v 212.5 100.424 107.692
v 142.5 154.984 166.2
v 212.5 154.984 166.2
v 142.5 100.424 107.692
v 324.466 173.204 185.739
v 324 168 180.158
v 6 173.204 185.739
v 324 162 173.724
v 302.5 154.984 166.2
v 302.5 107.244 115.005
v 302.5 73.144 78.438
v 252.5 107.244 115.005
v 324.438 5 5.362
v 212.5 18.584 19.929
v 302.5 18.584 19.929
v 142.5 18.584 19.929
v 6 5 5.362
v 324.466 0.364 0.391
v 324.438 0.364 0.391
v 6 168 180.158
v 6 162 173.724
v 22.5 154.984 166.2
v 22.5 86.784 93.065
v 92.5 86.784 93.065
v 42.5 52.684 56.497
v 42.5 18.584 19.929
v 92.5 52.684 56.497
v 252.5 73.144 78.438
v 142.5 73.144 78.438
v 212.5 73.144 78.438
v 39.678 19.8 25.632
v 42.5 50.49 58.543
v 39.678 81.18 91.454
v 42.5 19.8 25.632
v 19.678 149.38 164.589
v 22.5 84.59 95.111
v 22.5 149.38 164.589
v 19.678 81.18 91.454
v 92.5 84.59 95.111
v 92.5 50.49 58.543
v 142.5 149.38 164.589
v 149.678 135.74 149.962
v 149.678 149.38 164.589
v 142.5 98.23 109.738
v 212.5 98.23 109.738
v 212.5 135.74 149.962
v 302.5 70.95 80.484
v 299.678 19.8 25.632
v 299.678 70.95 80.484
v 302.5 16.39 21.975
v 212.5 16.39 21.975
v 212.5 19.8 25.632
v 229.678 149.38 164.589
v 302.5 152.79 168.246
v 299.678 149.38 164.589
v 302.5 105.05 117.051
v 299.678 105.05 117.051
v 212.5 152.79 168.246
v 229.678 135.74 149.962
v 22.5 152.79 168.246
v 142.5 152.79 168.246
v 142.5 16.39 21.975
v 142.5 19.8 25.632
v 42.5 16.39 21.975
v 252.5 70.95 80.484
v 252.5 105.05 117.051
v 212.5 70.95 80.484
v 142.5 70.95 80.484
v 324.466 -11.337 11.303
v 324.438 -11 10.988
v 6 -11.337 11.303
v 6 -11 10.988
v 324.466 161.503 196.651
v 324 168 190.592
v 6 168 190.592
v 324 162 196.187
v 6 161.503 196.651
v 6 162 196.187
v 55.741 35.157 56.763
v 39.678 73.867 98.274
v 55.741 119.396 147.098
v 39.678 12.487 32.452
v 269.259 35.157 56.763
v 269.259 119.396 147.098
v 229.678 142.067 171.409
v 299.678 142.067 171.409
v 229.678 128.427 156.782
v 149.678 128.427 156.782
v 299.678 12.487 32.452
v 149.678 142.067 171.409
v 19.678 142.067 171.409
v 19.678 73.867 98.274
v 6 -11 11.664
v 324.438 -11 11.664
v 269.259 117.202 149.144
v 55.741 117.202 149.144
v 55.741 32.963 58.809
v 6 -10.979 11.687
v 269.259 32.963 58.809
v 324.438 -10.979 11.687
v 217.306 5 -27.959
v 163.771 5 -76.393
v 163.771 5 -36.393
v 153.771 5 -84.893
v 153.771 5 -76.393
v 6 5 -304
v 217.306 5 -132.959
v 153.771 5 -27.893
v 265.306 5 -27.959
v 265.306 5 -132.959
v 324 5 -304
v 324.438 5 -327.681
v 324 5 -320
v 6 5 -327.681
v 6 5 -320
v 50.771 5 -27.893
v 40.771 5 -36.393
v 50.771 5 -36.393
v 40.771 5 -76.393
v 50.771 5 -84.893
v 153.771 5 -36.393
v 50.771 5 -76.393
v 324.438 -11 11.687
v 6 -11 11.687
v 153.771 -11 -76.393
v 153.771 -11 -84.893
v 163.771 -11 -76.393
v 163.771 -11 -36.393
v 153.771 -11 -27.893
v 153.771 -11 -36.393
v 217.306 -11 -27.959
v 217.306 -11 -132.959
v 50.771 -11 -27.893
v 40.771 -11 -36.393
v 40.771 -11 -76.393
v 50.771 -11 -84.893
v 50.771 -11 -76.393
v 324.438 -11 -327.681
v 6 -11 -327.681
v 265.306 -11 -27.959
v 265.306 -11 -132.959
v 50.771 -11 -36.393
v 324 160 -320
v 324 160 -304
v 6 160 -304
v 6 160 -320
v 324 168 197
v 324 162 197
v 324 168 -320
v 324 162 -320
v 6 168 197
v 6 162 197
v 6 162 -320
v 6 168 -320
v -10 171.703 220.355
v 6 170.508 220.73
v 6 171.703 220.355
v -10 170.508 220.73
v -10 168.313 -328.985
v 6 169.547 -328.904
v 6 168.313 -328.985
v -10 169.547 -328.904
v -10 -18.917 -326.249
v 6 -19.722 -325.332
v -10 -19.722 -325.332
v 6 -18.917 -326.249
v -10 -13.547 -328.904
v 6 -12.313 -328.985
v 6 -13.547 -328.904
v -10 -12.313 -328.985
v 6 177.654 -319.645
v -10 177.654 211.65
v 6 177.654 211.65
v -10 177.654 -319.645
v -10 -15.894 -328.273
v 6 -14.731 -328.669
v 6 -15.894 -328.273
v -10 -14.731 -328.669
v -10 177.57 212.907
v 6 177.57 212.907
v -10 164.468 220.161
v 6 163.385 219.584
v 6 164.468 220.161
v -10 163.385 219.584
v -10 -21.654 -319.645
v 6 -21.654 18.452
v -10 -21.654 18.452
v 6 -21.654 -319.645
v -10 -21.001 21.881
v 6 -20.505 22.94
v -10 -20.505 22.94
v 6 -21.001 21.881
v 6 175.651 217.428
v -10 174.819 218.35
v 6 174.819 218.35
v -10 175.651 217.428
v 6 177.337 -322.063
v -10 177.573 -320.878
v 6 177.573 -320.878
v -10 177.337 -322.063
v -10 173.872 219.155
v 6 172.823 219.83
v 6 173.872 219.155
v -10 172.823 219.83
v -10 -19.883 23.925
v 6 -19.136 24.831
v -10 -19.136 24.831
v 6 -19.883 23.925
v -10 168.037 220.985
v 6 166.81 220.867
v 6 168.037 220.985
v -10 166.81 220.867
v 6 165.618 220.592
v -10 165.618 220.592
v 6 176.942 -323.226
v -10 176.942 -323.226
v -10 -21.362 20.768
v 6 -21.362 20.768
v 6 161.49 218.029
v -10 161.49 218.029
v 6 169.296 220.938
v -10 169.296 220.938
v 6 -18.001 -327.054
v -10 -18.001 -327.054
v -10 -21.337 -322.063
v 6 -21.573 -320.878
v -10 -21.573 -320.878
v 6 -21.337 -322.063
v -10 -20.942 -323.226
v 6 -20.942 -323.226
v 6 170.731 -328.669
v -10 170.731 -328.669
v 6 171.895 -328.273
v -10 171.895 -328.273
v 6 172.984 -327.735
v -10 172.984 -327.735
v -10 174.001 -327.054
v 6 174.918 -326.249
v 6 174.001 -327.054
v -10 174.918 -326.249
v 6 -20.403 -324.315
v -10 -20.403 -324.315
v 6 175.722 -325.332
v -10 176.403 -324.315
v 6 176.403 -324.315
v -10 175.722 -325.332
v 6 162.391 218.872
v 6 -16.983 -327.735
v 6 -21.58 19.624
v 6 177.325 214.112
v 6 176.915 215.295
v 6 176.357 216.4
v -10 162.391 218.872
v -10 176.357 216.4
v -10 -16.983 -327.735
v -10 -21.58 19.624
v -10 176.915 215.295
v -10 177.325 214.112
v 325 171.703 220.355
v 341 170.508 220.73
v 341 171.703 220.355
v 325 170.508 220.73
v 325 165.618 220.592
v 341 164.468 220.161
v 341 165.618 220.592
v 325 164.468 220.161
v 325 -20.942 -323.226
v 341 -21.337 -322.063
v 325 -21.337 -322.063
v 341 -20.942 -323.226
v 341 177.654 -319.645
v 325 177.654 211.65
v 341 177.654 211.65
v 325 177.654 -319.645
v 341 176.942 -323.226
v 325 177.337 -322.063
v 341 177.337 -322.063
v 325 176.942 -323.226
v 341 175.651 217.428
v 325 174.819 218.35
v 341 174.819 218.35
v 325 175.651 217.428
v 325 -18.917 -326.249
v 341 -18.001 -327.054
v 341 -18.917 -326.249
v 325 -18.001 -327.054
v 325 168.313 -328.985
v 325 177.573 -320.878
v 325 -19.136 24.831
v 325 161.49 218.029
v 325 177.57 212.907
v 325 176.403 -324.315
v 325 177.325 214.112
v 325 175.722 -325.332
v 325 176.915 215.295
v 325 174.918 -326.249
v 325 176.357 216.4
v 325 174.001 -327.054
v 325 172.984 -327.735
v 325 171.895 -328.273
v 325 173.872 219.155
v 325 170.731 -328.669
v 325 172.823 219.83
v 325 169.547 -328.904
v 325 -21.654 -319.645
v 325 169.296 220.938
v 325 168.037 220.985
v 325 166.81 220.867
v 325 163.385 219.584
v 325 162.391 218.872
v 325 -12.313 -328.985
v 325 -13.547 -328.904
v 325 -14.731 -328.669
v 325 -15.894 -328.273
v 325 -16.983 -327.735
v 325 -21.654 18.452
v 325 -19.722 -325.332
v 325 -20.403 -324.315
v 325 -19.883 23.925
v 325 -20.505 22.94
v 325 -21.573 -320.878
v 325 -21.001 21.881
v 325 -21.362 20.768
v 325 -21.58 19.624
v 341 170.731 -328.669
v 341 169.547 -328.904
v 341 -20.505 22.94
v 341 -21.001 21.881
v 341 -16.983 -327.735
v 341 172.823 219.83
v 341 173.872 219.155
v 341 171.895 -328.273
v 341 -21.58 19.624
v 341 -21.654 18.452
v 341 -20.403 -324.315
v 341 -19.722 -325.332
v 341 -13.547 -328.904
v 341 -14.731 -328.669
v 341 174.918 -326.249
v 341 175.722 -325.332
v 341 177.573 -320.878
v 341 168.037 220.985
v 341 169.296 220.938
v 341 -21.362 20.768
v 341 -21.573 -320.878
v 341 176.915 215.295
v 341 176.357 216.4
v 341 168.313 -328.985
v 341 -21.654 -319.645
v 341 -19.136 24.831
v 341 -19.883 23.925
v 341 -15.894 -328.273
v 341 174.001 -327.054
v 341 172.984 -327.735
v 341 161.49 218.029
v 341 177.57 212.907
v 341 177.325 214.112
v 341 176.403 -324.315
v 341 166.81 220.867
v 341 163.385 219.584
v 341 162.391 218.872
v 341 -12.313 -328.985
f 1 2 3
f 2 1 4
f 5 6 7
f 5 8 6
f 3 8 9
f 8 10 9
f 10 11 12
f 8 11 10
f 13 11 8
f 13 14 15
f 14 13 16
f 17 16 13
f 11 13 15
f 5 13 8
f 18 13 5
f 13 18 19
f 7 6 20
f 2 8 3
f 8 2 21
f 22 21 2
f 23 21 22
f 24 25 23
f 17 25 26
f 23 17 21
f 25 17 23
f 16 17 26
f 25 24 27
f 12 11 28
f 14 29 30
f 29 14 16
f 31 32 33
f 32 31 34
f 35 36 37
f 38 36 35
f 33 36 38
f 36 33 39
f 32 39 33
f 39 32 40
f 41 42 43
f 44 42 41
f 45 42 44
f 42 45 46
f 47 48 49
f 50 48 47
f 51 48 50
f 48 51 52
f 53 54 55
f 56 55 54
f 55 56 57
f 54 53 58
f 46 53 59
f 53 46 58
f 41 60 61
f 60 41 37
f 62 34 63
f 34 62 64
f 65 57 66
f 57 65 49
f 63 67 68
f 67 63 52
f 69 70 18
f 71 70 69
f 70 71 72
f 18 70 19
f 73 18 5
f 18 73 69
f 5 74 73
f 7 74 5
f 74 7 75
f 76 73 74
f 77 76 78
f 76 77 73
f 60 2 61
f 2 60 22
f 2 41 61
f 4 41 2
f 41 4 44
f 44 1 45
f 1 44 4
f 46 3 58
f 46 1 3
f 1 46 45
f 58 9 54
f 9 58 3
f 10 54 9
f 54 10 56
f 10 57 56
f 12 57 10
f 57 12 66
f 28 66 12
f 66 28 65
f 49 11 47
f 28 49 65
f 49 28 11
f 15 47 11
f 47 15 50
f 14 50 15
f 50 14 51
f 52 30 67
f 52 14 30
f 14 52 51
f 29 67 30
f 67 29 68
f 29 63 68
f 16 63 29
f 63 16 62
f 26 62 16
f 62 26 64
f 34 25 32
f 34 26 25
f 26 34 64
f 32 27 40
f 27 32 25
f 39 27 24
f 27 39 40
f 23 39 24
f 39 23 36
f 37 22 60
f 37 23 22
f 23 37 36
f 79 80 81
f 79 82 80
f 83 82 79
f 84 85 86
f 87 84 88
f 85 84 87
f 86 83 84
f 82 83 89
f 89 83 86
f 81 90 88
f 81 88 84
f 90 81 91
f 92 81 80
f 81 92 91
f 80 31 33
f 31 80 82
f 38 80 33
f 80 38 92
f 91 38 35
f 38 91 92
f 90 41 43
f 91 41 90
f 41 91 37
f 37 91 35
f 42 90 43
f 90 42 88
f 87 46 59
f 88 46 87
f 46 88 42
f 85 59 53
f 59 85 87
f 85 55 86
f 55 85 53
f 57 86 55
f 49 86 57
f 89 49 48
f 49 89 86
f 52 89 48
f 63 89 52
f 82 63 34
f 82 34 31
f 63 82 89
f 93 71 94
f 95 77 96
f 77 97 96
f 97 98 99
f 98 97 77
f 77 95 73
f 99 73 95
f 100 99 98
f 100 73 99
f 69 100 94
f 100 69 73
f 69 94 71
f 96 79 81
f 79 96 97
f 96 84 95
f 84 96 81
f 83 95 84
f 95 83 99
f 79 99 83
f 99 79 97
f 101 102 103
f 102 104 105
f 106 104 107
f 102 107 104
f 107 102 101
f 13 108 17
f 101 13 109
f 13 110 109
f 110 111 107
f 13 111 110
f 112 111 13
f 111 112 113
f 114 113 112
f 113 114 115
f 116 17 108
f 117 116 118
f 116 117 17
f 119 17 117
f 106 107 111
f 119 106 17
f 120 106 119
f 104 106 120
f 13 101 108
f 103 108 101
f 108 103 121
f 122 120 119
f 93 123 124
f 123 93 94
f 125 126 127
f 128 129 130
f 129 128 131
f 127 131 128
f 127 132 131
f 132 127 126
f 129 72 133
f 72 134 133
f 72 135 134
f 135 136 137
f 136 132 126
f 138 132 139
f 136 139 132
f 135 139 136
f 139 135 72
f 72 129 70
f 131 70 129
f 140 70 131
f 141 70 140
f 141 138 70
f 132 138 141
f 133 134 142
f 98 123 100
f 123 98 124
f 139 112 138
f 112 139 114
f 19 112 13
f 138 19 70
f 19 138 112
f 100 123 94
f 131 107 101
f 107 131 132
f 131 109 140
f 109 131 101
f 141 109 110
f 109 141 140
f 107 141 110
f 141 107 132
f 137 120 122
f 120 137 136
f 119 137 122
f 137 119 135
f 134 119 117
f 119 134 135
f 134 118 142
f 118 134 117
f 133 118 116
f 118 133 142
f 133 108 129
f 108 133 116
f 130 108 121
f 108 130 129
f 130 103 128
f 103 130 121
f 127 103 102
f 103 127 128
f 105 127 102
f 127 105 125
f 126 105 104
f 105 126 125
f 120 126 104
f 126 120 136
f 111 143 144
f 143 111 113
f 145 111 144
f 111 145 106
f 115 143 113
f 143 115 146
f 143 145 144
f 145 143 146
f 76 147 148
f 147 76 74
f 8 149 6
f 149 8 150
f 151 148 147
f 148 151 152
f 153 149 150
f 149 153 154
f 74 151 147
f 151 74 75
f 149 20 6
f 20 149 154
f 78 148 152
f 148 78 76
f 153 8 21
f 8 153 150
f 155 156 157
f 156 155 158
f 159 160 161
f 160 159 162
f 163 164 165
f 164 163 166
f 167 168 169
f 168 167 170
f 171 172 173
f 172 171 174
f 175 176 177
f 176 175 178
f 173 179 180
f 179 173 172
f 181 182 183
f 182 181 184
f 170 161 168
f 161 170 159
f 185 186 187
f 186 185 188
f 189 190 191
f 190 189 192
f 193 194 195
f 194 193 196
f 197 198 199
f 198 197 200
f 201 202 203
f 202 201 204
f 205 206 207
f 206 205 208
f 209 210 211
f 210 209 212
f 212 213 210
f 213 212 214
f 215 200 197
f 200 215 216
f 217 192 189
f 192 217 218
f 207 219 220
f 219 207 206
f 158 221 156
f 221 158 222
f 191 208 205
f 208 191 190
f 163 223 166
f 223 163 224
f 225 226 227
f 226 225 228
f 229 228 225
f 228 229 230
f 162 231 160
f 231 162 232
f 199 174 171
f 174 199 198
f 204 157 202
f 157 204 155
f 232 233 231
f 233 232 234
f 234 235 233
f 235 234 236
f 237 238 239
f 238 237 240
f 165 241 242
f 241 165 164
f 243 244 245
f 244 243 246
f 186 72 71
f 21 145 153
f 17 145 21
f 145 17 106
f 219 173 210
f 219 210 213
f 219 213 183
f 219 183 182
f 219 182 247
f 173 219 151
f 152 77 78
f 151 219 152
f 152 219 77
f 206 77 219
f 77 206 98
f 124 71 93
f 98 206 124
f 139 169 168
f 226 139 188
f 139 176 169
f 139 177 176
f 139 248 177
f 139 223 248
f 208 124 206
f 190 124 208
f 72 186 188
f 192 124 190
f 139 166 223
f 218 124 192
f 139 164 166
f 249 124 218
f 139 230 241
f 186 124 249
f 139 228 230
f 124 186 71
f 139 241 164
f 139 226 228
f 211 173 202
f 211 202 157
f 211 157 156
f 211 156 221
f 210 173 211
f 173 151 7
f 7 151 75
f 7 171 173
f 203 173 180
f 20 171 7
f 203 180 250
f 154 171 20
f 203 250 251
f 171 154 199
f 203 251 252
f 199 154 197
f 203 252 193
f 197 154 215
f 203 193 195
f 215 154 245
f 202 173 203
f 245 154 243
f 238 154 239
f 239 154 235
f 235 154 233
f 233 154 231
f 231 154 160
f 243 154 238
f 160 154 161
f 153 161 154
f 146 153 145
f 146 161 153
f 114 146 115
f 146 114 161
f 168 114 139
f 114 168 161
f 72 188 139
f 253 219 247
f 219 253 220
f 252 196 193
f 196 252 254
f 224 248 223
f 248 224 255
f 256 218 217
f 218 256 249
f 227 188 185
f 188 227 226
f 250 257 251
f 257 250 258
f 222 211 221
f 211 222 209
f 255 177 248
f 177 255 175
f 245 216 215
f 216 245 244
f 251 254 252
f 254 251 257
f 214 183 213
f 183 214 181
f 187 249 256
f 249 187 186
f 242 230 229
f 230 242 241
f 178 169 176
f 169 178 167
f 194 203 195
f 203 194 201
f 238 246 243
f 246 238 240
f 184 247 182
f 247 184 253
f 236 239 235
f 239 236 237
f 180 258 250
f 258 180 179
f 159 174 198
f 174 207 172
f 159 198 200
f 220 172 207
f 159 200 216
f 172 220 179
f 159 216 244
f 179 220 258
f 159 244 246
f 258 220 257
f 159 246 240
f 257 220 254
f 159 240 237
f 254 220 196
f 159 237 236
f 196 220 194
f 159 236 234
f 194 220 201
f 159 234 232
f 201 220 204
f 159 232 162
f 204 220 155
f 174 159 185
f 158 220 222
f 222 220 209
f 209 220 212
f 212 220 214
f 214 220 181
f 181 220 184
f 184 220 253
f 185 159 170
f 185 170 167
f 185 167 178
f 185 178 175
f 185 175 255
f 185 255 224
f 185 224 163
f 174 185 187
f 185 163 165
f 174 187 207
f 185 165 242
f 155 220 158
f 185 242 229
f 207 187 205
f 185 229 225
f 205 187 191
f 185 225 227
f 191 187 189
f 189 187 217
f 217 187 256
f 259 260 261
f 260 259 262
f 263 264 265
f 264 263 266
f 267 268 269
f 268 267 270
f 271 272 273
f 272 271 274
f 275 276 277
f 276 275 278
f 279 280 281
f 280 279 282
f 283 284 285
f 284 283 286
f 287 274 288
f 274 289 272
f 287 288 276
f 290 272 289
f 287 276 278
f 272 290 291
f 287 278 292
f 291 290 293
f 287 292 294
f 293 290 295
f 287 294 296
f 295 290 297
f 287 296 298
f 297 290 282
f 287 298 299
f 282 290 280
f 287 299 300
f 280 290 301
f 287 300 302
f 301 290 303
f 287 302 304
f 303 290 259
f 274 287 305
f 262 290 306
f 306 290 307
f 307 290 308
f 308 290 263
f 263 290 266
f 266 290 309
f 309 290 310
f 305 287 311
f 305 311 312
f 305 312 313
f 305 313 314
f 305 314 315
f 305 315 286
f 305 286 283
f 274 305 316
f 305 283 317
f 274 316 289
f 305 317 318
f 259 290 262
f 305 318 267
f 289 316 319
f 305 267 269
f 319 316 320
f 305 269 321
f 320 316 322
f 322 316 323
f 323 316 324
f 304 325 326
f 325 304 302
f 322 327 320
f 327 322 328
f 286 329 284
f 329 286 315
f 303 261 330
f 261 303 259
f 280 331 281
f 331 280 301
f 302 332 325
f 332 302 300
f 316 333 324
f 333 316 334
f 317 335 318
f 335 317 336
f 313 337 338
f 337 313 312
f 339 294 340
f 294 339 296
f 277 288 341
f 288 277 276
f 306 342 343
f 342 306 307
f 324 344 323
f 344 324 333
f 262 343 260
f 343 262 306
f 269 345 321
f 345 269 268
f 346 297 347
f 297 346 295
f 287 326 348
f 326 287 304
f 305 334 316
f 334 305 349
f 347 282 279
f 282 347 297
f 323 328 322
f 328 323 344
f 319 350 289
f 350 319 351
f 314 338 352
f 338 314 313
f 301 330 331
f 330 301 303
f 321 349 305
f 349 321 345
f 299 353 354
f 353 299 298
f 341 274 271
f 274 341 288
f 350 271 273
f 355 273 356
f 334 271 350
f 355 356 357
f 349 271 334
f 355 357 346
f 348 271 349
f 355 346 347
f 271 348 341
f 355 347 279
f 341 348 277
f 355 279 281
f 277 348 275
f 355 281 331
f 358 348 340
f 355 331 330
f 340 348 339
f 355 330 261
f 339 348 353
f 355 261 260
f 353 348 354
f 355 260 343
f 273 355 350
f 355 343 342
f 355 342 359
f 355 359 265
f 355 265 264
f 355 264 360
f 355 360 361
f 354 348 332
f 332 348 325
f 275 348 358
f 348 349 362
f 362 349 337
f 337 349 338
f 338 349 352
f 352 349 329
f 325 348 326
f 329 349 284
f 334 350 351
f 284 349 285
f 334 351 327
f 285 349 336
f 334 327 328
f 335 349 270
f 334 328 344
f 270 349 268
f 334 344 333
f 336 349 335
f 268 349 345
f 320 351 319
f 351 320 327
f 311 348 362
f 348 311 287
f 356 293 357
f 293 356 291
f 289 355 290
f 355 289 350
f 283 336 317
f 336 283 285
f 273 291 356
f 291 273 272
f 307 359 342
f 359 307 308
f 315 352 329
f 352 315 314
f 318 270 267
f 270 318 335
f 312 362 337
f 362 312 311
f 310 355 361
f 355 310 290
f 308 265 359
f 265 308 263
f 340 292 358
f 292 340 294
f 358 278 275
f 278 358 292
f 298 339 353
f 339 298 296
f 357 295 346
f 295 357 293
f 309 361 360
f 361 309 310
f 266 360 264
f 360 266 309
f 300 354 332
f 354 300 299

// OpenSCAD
/* 3D representation of Donation Box
*  
* Description: A 3D model of the initial version of Donation Box. The design include the tablet casing, the thermal printer and coin acceptor cuts. Details are not included.
*
* Author: Commonslab.gr
* License: CC-BY-SA v4.0 
*/

/*Set Themes*/
theme = "greek island"; //"attention";

surface_color = theme=="greek island" ? "RoyalBlue" : "OrangeRed";
side_color = theme=="greek island" ? "White" : "DarkSlateGray";

tablet_color ="Black";
tablet_back_color="Black";


module side_panel(h)
{
    color(side_color)
  scale([25.4/90, -25.4/90, 1]) union()
  {
    linear_extrude(height=h)
      polygon([[319.029295,-974.355450],[314.679432,-973.939007],[310.458314,-972.963828],[306.384014,-971.438098],[302.544942,-969.391321],[299.021511,-966.870154],[295.832035,-963.882850],[289.023977,-956.600953],[282.215482,-949.318588],[275.407413,-942.036679],[268.598413,-934.753775],[261.789307,-927.470756],[254.980939,-920.188527],[248.171642,-912.905305],[241.363305,-905.623109],[234.554502,-898.340415],[227.746157,-891.058211],[220.937034,-883.775174],[214.128652,-876.492931],[207.320120,-869.210526],[200.511764,-861.928310],[193.703336,-854.646017],[186.894858,-847.363671],[180.086214,-840.081147],[173.277629,-832.798685],[166.468953,-825.516128],[159.659941,-818.233210],[152.851555,-810.950962],[146.042875,-803.668399],[139.234505,-796.386168],[132.425406,-789.103157],[125.616278,-781.820116],[118.807447,-774.537391],[111.998923,-767.254995],[105.190460,-759.972666],[98.381608,-752.689918],[91.572839,-745.407261],[84.764491,-738.125054],[77.955724,-730.842398],[71.146715,-723.559483],[64.338657,-716.277587],[57.529534,-708.994550],[50.720528,-701.711639],[43.911776,-694.429000],[37.102428,-687.145722],[30.293767,-679.863180],[23.485092,-672.580623],[16.675834,-665.297442],[9.867542,-658.015294],[3.058906,-650.732779],[-3.749237,-643.450790],[-10.557822,-636.168330],[-17.366598,-628.885664],[-24.175111,-621.603281],[-30.983607,-614.320915],[-37.792960,-607.037632],[-44.601929,-599.754761],[-51.410783,-592.472012],[-58.219437,-585.189478],[-65.027440,-577.907639],[-71.835634,-570.625596],[-78.644362,-563.342983],[-85.452664,-556.060824],[-92.261482,-548.778113],[-99.070349,-541.495352],[-105.879711,-534.212059],[-112.687837,-526.930089],[-119.496699,-519.647332],[-126.305882,-512.364232],[-133.114110,-505.082152],[-139.923227,-497.799123],[-146.732507,-490.515919],[-153.541344,-483.233188],[-160.350290,-475.950340],[-167.158346,-468.668445],[-173.967517,-461.385358],[-180.775487,-454.103555],[-187.584495,-446.820641],[-194.393065,-439.538197],[-201.202115,-432.255238],[-208.010263,-424.973244],[-214.819073,-417.690543],[-221.627435,-410.408321],[-228.436147,-403.125724],[-235.244852,-395.843134],[-242.053874,-388.560206],[-248.862344,-381.277868],[-255.671515,-373.994781],[-262.480111,-366.712308],[-269.289174,-359.429335],[-276.098318,-352.146276],[-282.906760,-344.863968],[-289.714668,-337.582232],[-296.523366,-330.299650],[-303.332344,-323.016769],[-310.140803,-315.734442],[-316.949991,-308.451337],[-323.758120,-301.169363],[-330.567011,-293.886575],[-337.375590,-286.604120],[-344.183595,-279.322280],[-346.827888,-276.111048],[-349.032827,-272.621875],[-350.792525,-268.869720],[-352.069664,-264.927118],[-352.841979,-260.872435],[-353.103515,-256.720720],[-353.103515,-246.737852],[-353.103515,-236.754129],[-353.103515,-226.770934],[-353.103515,-216.787561],[-353.103515,-206.804260],[-353.103515,-196.821059],[-353.103515,-186.838536],[-353.103515,-176.855324],[-353.103515,-166.872553],[-353.103515,-156.889702],[-353.103515,-146.906390],[-353.103515,-136.923699],[-353.103515,-126.941378],[-353.103515,-116.958674],[-353.103515,-106.976266],[-353.103515,-96.994010],[-353.103515,-87.009990],[-353.103515,-77.026982],[-353.103515,-67.043535],[-353.103515,-57.060108],[-353.103515,-47.077527],[-353.103515,-37.095272],[-353.103515,-27.111657],[-353.103515,-17.128026],[-353.103515,-7.144922],[-353.103515,2.837811],[-353.103515,12.820944],[-353.103515,22.803735],[-353.103515,32.787934],[-353.103515,42.771589],[-353.103515,52.755131],[-353.103515,62.739282],[-353.103515,72.722966],[-353.103515,82.705326],[-353.103515,92.687741],[-353.103515,102.671740],[-353.103515,112.654902],[-353.103515,122.639000],[-353.103515,132.621830],[-353.103515,142.605324],[-353.103515,152.589434],[-353.103515,162.572156],[-353.103515,172.555525],[-353.103515,182.539573],[-353.103515,192.522367],[-353.103515,202.505914],[-353.103515,212.488270],[-353.103515,222.471361],[-353.103515,232.455106],[-353.103515,242.437469],[-353.103515,252.420183],[-353.103515,262.402981],[-353.103515,272.385523],[-353.103515,282.369222],[-353.103515,292.351689],[-353.103515,302.334120],[-353.103515,312.317539],[-353.103515,322.301023],[-353.103515,332.283533],[-353.103515,342.267383],[-353.103515,352.251184],[-353.103515,362.233422],[-353.103515,372.215805],[-353.103515,382.199745],[-353.103515,392.183093],[-353.103515,402.166782],[-353.103515,412.149848],[-353.103515,422.132666],[-353.103515,432.116840],[-353.103515,442.100515],[-353.103515,452.083103],[-353.103515,462.066641],[-353.103515,472.049744],[-353.103515,482.032127],[-353.103515,492.014478],[-353.103515,501.996962],[-353.103515,511.980570],[-353.103515,521.964332],[-353.103515,531.948053],[-353.103515,541.932188],[-353.103515,551.915204],[-353.103515,561.898621],[-353.103515,571.881821],[-353.103515,581.864528],[-353.103515,591.847821],[-353.103515,601.831637],[-353.103515,611.814775],[-353.103515,621.797029],[-353.103515,631.780985],[-353.103515,641.763440],[-353.103515,651.745736],[-353.103515,661.729137],[-353.103515,671.712731],[-353.103515,681.697004],[-353.103515,691.679868],[-353.103515,701.663309],[-353.103515,711.647473],[-353.103515,721.630433],[-353.103515,731.613833],[-353.103515,741.597241],[-353.103515,751.580344],[-353.103515,761.564408],[-353.103515,771.548167],[-353.103515,781.531405],[-353.103515,791.514898],[-353.103515,801.497618],[-353.103515,811.481655],[-353.103515,821.465307],[-353.103515,831.448642],[-353.103515,841.431598],[-353.103515,851.414839],[-353.103515,861.397375],[-353.103515,871.380402],[-353.103515,881.363797],[-353.103515,891.346885],[-353.103515,901.329165],[-353.103515,911.312853],[-353.103515,921.296215],[-353.103515,931.279647],[-353.103515,941.261700],[-352.816875,945.631696],[-351.982594,949.828971],[-350.581439,953.951624],[-348.672946,957.810326],[-346.259911,961.413610],[-343.408127,964.661999],[-340.159359,967.513686],[-336.555694,969.926539],[-332.697035,971.834590],[-328.574485,973.235313],[-324.377484,974.069176],[-320.007815,974.355450],[-310.161031,974.355450],[-300.314646,974.355450],[-290.468112,974.355450],[-280.621565,974.355450],[-270.775304,974.355450],[-260.928875,974.355450],[-251.083079,974.355450],[-241.236310,974.355450],[-231.389788,974.355450],[-221.542735,974.355450],[-211.696755,974.355450],[-201.850628,974.355450],[-192.003543,974.355450],[-182.157429,974.355450],[-172.312002,974.355450],[-162.465803,974.355450],[-152.619223,974.355450],[-142.772917,974.355450],[-132.926055,974.355450],[-123.078894,974.355450],[-113.233049,974.355450],[-103.387350,974.355450],[-93.540277,974.355450],[-83.694414,974.355450],[-73.847986,974.355450],[-64.001458,974.355450],[-54.155480,974.355450],[-44.308978,974.355450],[-34.463370,974.355450],[-24.616628,974.355450],[-14.769454,974.355450],[-4.923303,974.355450],[4.923268,974.355450],[14.770535,974.355450],[24.617547,974.355450],[34.463807,974.355450],[44.310704,974.355450],[54.157756,974.355450],[64.004164,974.355450],[73.850099,974.355450],[83.696214,974.355450],[93.543132,974.355450],[103.389544,974.355450],[113.236001,974.355450],[123.081304,974.355450],[132.926987,974.355450],[142.773377,974.355450],[152.619711,974.355450],[162.466102,974.355450],[172.312466,974.355450],[182.158109,974.355450],[192.005170,974.355450],[201.851264,974.355450],[211.697363,974.355450],[221.543972,974.355450],[231.390644,974.355450],[241.236717,974.355450],[251.082284,974.355450],[260.928301,974.355450],[270.774493,974.355450],[280.621468,974.355450],[290.468029,974.355450],[300.315289,974.355450],[310.161999,974.355450],[320.007815,974.355450],[324.377828,974.069052],[328.575151,973.235007],[332.697888,971.834089],[336.556701,969.925822],[340.160128,967.513000],[343.408684,964.661412],[346.260562,961.412817],[348.673627,957.809301],[350.581906,953.950761],[351.982873,949.828299],[352.816983,945.631351],[353.103515,941.261700],[353.103515,931.300766],[353.103515,921.340330],[353.103515,911.379727],[353.103515,901.419697],[353.103515,891.460141],[353.103515,881.499304],[353.103515,871.539334],[353.103515,861.578376],[353.103515,851.617358],[353.103515,841.656162],[353.103515,831.695699],[353.103515,821.735663],[353.103515,811.775266],[353.103515,801.813807],[353.103515,791.852883],[353.103515,781.892952],[353.103515,771.933014],[353.103515,761.972693],[353.103515,752.012969],[353.103515,742.052596],[353.103515,732.091181],[353.103515,722.130996],[353.103515,712.170158],[353.103515,702.209910],[353.103515,692.249058],[353.103515,682.288462],[353.103515,672.328248],[353.103515,662.367875],[353.103515,652.407717],[353.103515,642.447637],[353.103515,632.487035],[353.103515,622.526434],[353.103515,612.566000],[353.103515,602.605576],[353.103515,592.644710],[353.103515,582.684247],[353.103515,572.723231],[353.103515,562.762061],[353.103515,552.800945],[353.103515,542.839916],[353.103515,532.878848],[353.103515,522.917468],[353.103515,512.956967],[353.103515,502.996822],[353.103515,493.036394],[353.103515,483.074945],[353.103515,473.114849],[353.103515,463.155195],[353.103515,453.194991],[353.103515,443.234783],[353.103515,433.275050],[353.103515,423.314613],[353.103515,413.353845],[353.103515,403.393071],[353.103515,393.432572],[353.103515,383.472590],[353.103515,373.511735],[353.103515,363.551780],[353.103515,353.591278],[353.103515,343.630358],[353.103515,333.670707],[353.103515,323.710822],[353.103515,313.750773],[353.103515,303.790615],[353.103515,293.830395],[353.103515,283.870148],[353.103515,273.909906],[353.103515,263.949694],[353.103515,253.989537],[353.103515,244.029459],[353.103515,234.067949],[353.103515,224.106585],[353.103515,214.146929],[353.103515,204.185967],[353.103515,194.225280],[353.103515,184.264932],[353.103515,174.303496],[353.103515,164.342571],[353.103515,154.382259],[353.103515,144.421198],[353.103515,134.461015],[353.103515,124.500398],[353.103515,114.539542],[353.103515,104.578662],[353.103515,94.617993],[353.103515,84.657796],[353.103515,74.696931],[353.103515,64.737145],[353.103515,54.775959],[353.103515,44.815181],[353.103515,34.853834],[353.103515,24.893767],[353.103515,14.934077],[353.103515,4.973928],[353.103515,-4.987448],[353.103515,-14.948065],[353.103515,-24.908610],[353.103515,-34.869699],[353.103515,-44.829251],[353.103515,-54.790400],[353.103515,-64.750959],[353.103515,-74.711310],[353.103515,-84.671761],[353.103515,-94.632541],[353.103515,-104.593803],[353.103515,-114.554384],[353.103515,-124.514312],[353.103515,-134.474754],[353.103515,-144.435546],[353.103515,-154.396445],[353.103515,-164.357127],[353.103515,-174.317185],[353.103515,-184.278452],[353.103515,-194.237994],[353.103515,-204.198568],[353.103515,-214.159336],[353.103515,-224.120488],[353.103515,-234.080987],[353.103515,-244.041884],[353.103515,-254.001904],[353.103515,-263.961814],[353.103515,-273.922201],[353.103515,-283.883468],[353.103515,-293.843791],[353.103515,-303.805310],[353.103515,-313.765889],[353.103515,-323.727253],[353.103515,-333.686955],[353.103515,-343.648227],[353.103515,-353.608235],[353.103515,-363.569666],[353.103515,-373.531140],[353.103515,-383.491102],[353.103515,-393.451386],[353.103515,-403.411683],[353.103515,-413.373126],[353.103515,-423.333063],[353.103515,-433.293689],[353.103515,-443.253415],[353.103515,-453.213611],[353.103515,-463.173565],[353.103515,-473.133745],[353.103515,-483.094131],[353.103515,-493.054214],[353.103515,-503.014481],[353.103515,-512.974821],[353.103515,-522.935951],[353.103515,-532.896509],[353.103515,-542.857263],[353.103515,-552.818179],[353.103515,-562.778434],[353.103515,-572.738942],[353.103515,-582.699610],[353.103515,-592.659343],[353.103515,-602.620745],[353.103515,-612.580410],[353.103515,-622.540634],[353.103515,-632.502051],[353.103515,-642.462619],[353.103515,-652.423877],[353.103515,-662.384317],[353.103515,-672.345272],[353.103515,-682.305589],[353.103515,-692.266989],[353.103515,-702.228066],[353.103515,-712.189278],[353.103515,-722.148926],[353.103515,-732.108975],[353.103515,-742.069229],[353.103515,-752.029587],[353.103515,-761.990239],[353.103515,-771.950258],[353.103515,-781.910944],[353.103515,-791.870991],[353.103515,-801.831901],[353.103515,-811.791970],[353.103515,-821.752072],[353.103515,-831.712622],[353.103515,-841.672324],[353.103515,-851.632479],[353.103515,-861.593851],[353.103515,-871.554342],[353.103515,-881.514942],[353.103515,-891.475858],[353.103515,-901.435835],[353.103515,-911.397031],[353.103515,-921.358714],[353.103515,-931.319675],[353.103515,-941.279350],[352.805548,-945.733349],[351.939949,-950.004420],[350.486112,-954.195753],[348.507937,-958.108471],[346.008572,-961.751490],[343.058688,-965.020626],[339.702935,-967.872427],[335.986772,-970.262662],[332.016908,-972.123593],[327.784133,-973.452089],[323.489687,-974.190132],[319.029295,-974.355450]]);
  }
}

module tablet_holder(angle) {
    rotate([angle,0,0]) {
        //Bottom support
        color(tablet_back_color)
        linear_extrude(height=3) import(file="tablet-bottom-support.dxf");
        //Sides support
        translate([0,0,3])
        color("SaddleBrown")
        linear_extrude(height=10) import(file="tablet-side-support.dxf");
        //Top surface (screen cover)
        translate([0,0,13])
        color(surface_color)
        linear_extrude(height=3) import(file="tablet-top.dxf");
    }
}

module front_panel() {
    rotate([90,0,0])
    color(surface_color)
    translate([0,-328,-5])
    linear_extrude(height=16) import(file="front_panel.dxf");
}

module bottom_panel() {
    translate([0,-10,-320])
    color(surface_color)
    cube([324,170,16]);
}

module back_panel() {
    translate([0,162,-320])
    color(surface_color)
    cube([324,6,517]);
}

//The 3 piece tablet holder
tablet_holder(47);
//Front panel with cuts for coin acceptor and printer
front_panel();

bottom_panel();
back_panel();

/**/
 //Left side
  translate([-10,78,-54]) 
     rotate([90,0,90])
    side_panel(16);

//Right side
  translate([325,78,-54]) 
     rotate([90,0,90])
side_panel(16);
/**/
